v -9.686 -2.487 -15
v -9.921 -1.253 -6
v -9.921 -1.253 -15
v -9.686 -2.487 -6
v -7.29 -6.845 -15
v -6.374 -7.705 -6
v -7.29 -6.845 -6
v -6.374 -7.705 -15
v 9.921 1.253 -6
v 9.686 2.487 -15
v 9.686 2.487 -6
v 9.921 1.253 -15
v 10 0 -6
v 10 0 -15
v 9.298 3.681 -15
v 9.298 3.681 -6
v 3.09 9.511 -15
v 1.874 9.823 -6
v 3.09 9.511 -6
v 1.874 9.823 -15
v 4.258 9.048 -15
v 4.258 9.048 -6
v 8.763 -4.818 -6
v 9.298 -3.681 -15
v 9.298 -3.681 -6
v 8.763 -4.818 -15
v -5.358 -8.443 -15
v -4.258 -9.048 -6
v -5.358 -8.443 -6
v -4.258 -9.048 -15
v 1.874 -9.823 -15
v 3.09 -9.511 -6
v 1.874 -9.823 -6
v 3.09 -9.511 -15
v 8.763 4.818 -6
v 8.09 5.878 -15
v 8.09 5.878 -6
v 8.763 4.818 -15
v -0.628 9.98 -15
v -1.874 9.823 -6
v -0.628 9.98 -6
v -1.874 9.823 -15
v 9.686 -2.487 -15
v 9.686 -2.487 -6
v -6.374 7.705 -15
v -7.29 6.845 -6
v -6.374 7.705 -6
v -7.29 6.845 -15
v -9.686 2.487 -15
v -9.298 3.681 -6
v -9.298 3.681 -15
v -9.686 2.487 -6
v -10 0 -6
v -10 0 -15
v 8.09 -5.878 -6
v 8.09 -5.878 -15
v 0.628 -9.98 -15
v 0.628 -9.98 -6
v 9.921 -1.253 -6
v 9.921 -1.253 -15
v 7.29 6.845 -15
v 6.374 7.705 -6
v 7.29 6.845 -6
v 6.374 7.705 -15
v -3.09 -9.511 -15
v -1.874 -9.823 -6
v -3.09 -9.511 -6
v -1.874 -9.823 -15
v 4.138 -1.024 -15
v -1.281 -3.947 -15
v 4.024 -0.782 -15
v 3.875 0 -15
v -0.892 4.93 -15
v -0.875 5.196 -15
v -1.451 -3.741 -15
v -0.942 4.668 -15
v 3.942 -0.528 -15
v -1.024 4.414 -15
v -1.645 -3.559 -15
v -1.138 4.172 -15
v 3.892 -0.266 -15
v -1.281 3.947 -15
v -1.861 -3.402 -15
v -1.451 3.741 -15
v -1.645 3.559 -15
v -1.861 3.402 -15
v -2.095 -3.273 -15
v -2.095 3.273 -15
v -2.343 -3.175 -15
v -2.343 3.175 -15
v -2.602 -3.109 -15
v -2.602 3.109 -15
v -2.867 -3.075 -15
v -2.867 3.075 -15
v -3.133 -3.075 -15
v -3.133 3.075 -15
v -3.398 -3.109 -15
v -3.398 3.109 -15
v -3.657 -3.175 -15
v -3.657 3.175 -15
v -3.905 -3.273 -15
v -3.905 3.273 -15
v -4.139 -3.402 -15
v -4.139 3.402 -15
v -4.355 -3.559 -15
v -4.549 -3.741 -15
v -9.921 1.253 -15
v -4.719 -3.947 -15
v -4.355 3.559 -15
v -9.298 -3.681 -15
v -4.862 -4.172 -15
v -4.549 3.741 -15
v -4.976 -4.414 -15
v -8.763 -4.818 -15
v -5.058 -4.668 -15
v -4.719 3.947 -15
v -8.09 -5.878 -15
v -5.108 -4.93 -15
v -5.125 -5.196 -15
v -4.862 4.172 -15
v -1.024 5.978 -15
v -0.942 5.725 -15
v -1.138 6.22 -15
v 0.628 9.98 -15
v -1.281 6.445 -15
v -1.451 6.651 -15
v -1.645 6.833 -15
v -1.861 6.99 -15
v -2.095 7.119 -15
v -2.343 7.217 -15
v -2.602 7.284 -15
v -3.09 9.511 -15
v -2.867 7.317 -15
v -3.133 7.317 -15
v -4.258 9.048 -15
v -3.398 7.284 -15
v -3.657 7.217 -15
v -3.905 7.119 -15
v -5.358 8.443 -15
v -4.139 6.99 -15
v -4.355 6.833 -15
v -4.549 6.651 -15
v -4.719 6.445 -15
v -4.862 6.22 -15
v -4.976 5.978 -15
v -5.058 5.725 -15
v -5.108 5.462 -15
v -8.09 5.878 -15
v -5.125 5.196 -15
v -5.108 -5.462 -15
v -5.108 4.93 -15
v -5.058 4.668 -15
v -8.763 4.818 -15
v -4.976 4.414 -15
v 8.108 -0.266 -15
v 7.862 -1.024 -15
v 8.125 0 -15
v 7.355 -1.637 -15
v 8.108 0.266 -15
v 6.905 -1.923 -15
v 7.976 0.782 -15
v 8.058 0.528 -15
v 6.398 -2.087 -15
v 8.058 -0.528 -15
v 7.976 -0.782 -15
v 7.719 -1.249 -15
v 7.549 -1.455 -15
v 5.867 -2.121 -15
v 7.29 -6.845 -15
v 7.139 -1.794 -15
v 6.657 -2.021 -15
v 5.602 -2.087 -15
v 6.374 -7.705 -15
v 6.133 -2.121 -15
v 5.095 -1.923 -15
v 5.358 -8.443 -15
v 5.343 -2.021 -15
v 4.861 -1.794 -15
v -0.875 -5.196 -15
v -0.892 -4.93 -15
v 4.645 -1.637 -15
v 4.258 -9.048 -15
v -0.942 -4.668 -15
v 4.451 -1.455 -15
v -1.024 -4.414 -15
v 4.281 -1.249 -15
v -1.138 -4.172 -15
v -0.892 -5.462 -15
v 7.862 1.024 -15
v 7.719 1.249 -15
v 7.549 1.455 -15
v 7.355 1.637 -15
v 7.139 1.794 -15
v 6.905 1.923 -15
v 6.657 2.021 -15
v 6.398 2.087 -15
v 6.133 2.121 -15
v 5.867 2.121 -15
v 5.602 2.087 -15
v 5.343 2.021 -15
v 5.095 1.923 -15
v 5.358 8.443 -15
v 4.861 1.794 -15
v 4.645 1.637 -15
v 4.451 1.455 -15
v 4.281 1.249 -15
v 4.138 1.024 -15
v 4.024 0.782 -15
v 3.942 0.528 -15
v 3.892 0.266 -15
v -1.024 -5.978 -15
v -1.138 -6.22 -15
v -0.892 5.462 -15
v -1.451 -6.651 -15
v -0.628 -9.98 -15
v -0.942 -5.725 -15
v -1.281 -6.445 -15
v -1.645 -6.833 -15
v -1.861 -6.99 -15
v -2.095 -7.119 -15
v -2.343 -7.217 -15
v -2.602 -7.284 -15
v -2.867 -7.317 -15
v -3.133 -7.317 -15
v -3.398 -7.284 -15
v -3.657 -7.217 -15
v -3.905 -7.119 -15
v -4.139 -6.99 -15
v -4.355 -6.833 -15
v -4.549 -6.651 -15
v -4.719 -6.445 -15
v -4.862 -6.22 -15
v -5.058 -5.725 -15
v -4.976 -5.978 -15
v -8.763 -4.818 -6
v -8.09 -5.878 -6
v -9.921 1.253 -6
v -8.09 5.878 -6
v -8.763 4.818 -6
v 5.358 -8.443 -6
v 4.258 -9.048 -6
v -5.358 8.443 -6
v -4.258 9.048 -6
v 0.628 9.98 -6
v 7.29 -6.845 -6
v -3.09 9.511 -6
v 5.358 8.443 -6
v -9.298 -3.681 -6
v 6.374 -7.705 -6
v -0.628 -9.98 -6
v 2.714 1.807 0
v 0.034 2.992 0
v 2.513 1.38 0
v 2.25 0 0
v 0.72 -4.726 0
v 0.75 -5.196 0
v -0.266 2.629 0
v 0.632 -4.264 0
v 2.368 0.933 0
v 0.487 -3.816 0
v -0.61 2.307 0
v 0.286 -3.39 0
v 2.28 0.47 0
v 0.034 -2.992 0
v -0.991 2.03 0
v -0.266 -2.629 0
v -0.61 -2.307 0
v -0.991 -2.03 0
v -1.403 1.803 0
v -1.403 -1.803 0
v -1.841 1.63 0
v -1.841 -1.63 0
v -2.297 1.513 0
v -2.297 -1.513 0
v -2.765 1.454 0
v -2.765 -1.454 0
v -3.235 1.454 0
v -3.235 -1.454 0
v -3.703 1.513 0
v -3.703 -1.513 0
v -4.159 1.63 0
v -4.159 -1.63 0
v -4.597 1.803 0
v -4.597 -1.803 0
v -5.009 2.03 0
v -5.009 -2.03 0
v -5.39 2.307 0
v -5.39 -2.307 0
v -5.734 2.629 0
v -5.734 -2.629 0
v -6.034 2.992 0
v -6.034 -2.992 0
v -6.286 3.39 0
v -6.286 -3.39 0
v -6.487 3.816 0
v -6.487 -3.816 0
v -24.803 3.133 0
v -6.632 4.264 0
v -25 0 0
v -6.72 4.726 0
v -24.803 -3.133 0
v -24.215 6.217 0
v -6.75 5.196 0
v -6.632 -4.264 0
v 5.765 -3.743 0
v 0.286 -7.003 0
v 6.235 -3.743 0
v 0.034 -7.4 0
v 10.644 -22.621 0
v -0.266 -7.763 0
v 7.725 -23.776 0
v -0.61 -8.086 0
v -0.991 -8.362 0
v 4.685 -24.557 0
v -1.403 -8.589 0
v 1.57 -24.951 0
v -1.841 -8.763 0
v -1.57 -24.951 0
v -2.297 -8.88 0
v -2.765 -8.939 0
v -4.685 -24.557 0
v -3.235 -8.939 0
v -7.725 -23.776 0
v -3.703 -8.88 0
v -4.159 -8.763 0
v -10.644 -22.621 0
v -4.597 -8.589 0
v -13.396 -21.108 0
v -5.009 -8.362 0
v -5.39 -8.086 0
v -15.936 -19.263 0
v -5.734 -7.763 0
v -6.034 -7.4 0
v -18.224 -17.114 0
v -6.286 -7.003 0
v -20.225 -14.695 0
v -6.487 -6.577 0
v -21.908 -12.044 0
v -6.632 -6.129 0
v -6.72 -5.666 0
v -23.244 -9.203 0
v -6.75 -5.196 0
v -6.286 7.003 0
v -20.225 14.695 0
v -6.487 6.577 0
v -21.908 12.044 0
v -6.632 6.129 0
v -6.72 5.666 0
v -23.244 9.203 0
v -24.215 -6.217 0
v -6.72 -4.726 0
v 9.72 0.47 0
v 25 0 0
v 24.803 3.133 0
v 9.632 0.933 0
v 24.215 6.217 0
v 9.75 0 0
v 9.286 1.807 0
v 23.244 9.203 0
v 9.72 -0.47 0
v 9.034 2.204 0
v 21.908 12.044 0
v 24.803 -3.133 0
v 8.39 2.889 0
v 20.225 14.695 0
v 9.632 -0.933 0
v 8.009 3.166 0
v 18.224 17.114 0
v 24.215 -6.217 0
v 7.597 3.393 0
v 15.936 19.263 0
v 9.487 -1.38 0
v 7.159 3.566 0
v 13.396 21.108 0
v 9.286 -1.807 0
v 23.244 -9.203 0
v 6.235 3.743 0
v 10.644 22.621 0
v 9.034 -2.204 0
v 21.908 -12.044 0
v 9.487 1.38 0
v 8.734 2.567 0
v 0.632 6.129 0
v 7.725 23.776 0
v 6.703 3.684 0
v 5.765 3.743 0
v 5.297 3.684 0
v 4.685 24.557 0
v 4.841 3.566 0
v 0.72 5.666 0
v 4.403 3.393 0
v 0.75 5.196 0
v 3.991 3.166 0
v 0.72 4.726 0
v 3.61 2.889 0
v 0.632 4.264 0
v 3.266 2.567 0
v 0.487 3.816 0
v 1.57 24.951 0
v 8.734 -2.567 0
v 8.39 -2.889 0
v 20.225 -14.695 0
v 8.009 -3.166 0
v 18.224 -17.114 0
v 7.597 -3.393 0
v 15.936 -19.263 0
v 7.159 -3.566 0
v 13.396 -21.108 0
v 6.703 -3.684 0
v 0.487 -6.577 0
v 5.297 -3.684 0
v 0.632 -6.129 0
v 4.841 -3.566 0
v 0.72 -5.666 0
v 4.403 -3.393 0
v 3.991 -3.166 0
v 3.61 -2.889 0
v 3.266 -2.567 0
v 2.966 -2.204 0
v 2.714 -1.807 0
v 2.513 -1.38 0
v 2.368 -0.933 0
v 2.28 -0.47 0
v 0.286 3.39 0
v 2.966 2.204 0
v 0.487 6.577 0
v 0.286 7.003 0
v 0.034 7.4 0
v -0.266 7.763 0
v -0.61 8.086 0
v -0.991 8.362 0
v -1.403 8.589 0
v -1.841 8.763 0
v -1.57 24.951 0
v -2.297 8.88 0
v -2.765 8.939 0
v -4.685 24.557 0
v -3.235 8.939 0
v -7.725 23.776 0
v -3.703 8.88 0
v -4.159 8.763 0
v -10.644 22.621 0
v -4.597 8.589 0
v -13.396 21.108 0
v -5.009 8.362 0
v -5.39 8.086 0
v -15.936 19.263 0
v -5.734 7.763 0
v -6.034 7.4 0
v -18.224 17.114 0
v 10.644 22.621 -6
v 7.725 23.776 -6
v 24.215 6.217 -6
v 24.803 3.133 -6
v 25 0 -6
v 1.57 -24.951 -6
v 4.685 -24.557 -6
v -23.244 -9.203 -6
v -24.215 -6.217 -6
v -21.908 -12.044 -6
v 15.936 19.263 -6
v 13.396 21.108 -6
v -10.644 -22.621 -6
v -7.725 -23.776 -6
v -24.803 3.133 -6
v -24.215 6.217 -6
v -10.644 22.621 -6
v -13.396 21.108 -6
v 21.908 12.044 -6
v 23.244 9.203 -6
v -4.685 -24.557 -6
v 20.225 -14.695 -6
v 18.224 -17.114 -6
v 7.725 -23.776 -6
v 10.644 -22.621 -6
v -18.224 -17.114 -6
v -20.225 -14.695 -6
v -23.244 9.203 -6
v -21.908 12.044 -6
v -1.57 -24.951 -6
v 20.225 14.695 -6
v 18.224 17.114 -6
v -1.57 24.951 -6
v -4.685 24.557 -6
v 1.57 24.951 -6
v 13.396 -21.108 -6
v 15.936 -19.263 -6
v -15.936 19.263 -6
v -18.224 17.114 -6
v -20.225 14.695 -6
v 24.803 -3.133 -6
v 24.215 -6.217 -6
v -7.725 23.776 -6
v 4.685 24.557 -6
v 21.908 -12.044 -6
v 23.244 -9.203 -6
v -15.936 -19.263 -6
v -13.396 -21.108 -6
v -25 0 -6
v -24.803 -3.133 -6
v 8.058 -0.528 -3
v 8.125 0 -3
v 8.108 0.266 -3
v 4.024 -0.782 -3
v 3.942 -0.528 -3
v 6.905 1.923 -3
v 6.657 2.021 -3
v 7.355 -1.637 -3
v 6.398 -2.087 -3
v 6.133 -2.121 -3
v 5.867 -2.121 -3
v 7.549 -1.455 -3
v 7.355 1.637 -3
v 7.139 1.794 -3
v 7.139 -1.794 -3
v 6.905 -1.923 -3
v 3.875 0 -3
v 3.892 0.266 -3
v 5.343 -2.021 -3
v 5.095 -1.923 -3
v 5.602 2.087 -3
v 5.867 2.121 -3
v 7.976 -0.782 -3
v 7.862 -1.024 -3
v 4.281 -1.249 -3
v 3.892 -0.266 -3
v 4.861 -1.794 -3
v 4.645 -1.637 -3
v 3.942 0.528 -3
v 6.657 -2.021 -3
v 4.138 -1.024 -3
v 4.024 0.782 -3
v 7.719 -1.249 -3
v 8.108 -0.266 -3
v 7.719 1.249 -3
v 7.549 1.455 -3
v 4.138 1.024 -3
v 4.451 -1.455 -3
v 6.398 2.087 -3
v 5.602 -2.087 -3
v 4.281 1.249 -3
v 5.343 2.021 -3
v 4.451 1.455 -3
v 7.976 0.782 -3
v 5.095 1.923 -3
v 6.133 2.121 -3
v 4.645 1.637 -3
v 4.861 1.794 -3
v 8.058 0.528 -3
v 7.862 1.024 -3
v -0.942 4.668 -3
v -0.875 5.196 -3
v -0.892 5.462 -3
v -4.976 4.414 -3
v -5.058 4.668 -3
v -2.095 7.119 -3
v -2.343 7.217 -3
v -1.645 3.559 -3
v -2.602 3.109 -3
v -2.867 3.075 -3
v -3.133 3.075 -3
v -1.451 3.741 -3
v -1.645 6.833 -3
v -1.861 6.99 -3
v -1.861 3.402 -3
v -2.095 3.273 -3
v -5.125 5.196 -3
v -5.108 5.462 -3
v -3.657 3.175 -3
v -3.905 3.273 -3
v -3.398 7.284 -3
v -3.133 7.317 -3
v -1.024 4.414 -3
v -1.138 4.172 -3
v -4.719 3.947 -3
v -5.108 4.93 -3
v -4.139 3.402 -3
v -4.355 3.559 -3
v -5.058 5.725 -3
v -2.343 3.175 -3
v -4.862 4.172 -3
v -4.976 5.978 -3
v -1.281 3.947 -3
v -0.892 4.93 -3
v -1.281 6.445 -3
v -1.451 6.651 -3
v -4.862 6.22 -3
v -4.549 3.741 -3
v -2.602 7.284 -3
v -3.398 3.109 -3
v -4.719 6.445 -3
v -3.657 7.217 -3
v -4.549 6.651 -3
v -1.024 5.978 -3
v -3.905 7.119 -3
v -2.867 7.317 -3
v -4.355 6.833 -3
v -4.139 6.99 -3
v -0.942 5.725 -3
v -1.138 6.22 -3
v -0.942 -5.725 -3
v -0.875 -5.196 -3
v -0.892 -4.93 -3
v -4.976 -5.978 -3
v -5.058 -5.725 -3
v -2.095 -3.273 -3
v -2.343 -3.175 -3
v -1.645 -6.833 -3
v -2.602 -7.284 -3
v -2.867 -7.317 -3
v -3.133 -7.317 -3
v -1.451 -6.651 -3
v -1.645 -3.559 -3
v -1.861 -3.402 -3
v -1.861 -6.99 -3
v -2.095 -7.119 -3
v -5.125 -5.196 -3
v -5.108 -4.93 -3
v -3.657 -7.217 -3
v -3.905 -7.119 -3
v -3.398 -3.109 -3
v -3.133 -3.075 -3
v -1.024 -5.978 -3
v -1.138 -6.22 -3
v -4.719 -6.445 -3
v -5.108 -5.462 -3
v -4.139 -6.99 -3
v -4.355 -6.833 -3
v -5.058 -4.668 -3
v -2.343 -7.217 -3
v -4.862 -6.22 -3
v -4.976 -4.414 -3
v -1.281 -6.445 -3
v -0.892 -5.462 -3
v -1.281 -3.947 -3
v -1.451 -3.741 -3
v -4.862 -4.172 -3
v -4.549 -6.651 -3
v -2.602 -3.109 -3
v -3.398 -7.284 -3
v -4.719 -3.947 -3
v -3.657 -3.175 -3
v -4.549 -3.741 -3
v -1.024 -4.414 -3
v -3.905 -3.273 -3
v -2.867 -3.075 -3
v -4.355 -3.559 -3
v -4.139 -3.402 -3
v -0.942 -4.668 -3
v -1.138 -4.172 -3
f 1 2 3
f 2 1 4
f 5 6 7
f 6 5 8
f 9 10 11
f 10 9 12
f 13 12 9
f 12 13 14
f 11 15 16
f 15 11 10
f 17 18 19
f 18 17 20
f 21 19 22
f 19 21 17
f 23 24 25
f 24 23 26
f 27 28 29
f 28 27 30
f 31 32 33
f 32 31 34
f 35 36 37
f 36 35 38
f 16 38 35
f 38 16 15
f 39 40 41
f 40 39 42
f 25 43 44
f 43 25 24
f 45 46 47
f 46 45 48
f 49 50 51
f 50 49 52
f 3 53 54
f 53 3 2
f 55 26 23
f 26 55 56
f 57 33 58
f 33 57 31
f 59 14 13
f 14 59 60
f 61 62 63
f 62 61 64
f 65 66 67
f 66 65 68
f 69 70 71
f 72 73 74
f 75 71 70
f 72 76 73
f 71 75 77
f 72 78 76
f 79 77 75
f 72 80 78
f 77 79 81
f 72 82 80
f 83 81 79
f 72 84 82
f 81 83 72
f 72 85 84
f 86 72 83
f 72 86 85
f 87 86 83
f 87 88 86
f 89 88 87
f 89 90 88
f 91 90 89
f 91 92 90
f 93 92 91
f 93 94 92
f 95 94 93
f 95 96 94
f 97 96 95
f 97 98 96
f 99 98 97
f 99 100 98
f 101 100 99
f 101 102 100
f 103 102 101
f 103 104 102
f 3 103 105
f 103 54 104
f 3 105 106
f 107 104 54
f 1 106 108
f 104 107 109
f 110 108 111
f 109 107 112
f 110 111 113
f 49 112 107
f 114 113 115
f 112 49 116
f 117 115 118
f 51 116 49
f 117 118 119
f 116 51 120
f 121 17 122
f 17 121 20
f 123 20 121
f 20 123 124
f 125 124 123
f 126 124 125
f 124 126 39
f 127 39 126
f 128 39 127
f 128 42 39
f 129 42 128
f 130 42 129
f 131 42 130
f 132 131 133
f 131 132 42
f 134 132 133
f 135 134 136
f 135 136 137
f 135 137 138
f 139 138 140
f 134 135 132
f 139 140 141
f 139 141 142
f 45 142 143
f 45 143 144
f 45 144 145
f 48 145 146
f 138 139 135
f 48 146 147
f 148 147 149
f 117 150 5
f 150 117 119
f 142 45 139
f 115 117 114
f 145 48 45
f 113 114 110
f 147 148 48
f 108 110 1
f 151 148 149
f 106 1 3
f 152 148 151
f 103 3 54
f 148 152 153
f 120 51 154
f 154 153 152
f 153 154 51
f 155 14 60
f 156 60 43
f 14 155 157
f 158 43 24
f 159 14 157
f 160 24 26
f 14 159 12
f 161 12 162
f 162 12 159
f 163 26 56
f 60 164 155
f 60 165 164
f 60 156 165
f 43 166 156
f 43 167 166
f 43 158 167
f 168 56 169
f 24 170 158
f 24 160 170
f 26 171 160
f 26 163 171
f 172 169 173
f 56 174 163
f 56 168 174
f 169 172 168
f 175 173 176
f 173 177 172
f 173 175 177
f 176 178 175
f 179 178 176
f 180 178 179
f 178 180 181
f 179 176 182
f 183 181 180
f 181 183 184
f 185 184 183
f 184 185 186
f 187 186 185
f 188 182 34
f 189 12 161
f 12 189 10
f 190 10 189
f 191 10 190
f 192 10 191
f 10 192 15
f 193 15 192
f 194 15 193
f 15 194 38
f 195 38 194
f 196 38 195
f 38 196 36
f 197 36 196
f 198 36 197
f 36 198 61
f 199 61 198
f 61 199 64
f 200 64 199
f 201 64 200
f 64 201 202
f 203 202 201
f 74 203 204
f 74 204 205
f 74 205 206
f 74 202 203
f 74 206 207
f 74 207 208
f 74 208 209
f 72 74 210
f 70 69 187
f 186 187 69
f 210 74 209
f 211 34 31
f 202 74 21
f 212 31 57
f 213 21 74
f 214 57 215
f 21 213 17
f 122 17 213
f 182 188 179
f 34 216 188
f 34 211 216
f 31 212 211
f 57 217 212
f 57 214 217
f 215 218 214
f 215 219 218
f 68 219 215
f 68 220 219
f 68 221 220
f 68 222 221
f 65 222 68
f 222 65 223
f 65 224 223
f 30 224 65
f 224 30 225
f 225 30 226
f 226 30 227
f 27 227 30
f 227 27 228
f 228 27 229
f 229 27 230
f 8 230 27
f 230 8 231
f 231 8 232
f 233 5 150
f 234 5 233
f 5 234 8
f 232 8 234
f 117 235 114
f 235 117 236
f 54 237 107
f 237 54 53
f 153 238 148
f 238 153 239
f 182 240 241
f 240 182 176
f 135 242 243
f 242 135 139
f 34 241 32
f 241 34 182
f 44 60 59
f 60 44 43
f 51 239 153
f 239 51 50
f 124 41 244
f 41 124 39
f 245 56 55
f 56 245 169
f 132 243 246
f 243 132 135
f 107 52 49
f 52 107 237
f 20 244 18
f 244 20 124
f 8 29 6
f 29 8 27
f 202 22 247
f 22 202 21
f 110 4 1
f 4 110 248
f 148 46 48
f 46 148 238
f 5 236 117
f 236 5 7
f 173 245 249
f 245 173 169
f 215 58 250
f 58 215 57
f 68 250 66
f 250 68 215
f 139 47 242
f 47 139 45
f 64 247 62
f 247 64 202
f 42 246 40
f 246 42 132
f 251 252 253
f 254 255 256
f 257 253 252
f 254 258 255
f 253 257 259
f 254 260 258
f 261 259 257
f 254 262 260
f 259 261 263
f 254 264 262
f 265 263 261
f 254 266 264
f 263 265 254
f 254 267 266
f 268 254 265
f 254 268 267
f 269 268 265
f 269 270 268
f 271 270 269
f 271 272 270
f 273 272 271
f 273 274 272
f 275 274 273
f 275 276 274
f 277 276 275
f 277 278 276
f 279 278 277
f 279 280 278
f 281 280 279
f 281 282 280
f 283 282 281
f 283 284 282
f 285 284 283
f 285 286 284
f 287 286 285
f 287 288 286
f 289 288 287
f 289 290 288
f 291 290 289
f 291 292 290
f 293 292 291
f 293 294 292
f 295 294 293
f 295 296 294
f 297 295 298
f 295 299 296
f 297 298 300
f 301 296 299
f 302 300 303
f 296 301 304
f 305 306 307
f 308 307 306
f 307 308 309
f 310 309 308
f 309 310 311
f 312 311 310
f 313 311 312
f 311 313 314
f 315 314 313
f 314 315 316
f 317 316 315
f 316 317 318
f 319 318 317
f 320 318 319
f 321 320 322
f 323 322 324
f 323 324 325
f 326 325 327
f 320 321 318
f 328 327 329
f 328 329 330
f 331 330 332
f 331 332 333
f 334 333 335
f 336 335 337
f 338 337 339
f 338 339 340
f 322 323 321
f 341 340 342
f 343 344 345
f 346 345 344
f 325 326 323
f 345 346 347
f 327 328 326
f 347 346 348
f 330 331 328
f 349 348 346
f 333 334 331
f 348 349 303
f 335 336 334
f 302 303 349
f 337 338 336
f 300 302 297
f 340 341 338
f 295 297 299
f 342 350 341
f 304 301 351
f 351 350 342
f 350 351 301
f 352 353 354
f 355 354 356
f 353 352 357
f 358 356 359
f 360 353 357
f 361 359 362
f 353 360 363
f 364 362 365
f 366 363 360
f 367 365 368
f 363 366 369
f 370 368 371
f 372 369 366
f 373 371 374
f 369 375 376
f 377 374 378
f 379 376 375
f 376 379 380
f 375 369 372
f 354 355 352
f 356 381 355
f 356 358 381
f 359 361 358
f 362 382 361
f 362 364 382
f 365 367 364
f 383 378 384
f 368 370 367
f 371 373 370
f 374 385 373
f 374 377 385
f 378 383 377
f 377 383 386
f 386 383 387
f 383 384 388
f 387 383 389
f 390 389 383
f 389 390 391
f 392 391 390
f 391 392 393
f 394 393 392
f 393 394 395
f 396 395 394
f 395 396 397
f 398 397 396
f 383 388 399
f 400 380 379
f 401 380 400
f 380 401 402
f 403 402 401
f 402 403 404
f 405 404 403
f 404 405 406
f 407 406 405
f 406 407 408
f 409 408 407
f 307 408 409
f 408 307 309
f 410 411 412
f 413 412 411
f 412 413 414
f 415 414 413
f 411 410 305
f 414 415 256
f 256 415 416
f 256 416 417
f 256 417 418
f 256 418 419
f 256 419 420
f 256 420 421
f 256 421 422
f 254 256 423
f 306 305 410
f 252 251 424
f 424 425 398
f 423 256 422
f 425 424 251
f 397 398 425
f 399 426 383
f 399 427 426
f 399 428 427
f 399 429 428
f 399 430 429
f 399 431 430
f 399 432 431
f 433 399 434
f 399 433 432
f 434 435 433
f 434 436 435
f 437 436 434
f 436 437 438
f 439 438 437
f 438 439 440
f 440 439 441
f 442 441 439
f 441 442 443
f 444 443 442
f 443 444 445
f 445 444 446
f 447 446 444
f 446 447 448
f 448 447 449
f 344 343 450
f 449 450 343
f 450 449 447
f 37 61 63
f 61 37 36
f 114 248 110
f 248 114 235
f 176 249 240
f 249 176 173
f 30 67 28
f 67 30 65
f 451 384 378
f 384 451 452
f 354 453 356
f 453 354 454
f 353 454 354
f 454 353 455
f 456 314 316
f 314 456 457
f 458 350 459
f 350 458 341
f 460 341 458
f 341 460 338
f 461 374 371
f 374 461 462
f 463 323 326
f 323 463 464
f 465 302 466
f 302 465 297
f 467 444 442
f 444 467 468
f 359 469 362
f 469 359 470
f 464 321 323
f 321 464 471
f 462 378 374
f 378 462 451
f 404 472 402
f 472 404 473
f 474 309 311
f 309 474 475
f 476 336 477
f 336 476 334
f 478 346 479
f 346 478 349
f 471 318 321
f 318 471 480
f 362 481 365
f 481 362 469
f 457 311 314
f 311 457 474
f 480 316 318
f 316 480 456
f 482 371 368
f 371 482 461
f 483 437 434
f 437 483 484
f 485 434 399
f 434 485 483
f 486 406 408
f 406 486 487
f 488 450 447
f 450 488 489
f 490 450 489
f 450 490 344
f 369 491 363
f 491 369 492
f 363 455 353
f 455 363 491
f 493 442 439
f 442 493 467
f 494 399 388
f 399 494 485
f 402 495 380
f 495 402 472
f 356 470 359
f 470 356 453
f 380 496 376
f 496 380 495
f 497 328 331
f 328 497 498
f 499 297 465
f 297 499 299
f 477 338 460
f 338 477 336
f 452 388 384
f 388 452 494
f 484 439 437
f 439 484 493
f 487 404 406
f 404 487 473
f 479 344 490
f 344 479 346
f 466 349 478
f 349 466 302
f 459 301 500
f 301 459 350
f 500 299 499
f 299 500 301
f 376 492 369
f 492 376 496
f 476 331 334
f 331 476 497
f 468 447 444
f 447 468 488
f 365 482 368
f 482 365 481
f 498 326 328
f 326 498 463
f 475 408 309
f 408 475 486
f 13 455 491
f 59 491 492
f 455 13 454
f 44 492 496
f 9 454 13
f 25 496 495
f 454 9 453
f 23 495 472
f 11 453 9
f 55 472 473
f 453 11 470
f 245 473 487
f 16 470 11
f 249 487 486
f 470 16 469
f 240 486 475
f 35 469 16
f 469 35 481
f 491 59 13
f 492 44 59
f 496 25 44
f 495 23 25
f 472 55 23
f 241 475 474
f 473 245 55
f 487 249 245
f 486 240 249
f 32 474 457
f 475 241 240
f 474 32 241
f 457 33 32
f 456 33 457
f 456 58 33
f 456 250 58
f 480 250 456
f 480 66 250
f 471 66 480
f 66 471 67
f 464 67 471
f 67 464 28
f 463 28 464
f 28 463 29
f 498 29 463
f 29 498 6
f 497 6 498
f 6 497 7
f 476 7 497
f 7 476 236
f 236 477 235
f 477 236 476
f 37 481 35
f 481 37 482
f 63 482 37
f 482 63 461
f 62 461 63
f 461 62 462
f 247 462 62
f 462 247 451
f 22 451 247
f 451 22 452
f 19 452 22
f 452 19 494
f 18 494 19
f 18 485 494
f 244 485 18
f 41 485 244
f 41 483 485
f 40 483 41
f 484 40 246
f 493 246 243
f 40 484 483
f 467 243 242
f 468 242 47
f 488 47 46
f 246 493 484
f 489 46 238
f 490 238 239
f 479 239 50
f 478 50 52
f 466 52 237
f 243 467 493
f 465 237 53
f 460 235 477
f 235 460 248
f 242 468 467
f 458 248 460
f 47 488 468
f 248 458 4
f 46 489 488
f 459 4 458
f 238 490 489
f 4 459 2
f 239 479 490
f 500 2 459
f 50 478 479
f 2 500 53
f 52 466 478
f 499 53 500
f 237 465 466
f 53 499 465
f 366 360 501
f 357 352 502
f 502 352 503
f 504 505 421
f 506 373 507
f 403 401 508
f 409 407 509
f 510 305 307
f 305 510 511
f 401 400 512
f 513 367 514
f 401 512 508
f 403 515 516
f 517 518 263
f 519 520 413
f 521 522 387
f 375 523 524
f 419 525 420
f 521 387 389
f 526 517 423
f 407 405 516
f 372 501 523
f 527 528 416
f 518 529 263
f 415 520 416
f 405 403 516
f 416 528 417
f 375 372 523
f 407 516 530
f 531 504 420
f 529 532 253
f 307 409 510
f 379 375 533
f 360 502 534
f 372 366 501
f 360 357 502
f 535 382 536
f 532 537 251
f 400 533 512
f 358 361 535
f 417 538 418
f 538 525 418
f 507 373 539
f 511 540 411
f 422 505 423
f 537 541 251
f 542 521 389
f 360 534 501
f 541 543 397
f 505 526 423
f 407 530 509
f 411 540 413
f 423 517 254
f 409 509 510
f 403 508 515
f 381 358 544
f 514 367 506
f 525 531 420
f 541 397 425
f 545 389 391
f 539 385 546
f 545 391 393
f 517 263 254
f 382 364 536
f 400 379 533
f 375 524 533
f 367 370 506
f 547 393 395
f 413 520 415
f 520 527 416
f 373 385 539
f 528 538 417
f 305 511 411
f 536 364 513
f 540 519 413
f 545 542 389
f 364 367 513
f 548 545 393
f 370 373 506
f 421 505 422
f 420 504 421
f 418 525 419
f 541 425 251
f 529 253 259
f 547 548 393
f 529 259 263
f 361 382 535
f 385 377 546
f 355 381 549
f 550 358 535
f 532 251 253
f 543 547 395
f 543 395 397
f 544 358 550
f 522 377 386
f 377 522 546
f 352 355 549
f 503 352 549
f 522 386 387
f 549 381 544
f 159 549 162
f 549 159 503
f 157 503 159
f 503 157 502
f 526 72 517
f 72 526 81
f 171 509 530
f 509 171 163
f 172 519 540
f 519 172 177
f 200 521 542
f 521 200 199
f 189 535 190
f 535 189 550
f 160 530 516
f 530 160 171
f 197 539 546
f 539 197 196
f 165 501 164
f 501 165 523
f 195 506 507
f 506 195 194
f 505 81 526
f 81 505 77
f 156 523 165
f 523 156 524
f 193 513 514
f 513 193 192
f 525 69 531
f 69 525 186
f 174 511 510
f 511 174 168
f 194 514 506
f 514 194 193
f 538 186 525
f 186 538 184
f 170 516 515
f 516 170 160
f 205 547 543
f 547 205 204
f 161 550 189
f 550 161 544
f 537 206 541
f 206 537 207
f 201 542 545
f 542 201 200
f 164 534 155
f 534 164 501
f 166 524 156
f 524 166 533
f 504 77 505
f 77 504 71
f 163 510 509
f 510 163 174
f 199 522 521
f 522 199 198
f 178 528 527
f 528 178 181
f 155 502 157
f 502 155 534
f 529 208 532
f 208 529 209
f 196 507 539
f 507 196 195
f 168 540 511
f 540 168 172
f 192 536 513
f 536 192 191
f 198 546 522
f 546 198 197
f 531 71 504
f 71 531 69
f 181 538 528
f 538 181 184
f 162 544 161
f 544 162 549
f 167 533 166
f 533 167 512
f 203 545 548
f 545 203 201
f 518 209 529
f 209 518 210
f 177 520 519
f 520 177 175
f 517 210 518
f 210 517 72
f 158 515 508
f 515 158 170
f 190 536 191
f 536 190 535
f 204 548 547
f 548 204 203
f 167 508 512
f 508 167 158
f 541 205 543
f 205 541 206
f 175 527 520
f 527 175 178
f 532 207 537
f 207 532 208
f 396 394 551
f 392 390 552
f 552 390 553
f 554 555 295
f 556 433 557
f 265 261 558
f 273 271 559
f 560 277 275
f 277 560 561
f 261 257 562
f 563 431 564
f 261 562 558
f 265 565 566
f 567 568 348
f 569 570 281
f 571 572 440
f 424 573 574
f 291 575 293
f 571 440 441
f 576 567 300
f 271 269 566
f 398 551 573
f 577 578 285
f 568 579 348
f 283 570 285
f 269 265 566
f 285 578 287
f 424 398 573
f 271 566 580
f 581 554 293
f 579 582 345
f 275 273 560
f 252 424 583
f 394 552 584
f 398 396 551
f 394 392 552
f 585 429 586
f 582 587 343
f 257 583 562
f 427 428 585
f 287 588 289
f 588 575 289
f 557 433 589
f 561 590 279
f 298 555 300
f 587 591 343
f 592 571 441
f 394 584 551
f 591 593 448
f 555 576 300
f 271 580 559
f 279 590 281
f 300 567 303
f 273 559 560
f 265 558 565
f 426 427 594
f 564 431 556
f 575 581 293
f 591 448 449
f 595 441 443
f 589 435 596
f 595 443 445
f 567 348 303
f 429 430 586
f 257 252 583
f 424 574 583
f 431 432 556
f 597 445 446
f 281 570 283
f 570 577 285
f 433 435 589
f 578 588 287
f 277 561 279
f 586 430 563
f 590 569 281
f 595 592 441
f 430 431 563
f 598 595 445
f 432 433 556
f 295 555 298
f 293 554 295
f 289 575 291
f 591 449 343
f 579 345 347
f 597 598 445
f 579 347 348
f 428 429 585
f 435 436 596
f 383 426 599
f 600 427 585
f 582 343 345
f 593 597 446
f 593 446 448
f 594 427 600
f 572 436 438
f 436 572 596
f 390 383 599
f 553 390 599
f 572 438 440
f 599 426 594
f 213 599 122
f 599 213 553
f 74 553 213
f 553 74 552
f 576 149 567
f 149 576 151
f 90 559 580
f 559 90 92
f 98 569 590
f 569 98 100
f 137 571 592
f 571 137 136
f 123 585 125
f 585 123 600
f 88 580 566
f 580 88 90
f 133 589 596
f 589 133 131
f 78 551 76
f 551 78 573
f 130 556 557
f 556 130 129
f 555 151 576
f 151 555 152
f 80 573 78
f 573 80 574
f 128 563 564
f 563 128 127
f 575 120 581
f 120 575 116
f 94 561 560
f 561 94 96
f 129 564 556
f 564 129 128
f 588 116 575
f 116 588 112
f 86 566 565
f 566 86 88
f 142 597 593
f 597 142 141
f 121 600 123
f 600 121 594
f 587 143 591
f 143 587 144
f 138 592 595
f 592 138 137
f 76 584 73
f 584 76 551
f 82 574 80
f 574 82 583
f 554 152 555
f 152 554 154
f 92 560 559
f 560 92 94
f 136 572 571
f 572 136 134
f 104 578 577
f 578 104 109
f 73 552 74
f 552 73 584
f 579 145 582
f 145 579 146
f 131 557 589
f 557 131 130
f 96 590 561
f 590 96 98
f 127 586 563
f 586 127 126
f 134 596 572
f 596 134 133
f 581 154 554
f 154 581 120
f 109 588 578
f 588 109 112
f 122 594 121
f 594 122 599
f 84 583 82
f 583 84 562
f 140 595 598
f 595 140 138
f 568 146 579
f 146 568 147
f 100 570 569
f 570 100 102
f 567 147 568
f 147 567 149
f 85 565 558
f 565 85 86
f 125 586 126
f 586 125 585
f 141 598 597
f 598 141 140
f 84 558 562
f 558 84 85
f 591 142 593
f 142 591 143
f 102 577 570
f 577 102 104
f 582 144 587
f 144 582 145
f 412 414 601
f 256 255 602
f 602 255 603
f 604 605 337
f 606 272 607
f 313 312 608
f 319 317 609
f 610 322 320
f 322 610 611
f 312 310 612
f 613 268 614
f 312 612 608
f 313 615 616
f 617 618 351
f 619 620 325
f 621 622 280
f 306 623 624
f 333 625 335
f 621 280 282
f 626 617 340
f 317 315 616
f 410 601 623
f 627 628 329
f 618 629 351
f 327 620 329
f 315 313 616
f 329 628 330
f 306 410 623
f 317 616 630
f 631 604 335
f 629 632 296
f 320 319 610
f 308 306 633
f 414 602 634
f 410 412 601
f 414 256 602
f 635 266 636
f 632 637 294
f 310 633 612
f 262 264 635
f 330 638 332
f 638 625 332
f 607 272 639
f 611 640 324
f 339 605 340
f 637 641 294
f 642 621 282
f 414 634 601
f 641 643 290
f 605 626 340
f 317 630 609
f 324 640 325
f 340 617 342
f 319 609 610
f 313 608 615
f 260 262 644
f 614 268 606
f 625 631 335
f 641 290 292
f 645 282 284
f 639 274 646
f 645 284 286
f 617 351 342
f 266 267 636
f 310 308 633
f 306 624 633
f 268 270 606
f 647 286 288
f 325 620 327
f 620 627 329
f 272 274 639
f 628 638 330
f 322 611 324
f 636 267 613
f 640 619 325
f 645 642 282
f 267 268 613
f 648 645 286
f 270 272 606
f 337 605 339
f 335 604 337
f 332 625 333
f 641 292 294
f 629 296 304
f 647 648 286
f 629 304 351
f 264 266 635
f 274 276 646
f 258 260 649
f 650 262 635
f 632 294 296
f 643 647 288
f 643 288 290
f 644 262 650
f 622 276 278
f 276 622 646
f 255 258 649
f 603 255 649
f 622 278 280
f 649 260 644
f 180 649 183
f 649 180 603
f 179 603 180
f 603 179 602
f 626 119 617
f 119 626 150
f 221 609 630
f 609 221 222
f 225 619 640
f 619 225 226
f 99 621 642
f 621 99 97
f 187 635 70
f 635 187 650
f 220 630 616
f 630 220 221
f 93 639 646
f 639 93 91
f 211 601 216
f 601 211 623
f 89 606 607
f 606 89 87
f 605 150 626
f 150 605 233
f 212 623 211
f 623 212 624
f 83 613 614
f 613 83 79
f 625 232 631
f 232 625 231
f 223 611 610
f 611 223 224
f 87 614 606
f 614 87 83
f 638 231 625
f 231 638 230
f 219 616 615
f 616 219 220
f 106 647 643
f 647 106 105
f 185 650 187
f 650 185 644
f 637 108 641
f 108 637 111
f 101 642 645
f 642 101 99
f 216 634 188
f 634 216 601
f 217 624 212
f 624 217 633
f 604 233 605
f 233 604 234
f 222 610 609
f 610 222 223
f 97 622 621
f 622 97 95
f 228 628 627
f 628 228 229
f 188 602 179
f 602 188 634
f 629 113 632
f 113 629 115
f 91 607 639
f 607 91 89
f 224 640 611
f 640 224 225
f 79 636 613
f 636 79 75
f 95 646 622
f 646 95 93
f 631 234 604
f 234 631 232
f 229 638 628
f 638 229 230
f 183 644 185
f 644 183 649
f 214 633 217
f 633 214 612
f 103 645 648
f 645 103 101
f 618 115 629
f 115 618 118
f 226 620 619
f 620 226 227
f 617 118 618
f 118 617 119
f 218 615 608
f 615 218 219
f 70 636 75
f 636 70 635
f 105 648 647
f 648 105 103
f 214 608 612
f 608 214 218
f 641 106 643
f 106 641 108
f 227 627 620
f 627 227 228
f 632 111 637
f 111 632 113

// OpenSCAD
$fn = 50;


difference() {
	union() {
		translate(v = [0, 0, -15.0000000000]) {
			cylinder(h = 15, r = 10.0000000000);
		}
		translate(v = [0, 0, -6.0000000000]) {
			cylinder(h = 6, r = 25.0000000000);
		}
	}
	union() {
		translate(v = [6.0000000000, 0.0000000000, 0]) {
			rotate(a = [0, 0, 0]) {
				difference() {
					union() {
						#translate(v = [0, 0, -15.0000000000]) {
							cylinder(h = 15, r = 2.0000000000);
						}
						#translate(v = [0, 0, -3]) {
							cylinder(h = 3, r = 10.0000000000, r1 = 2.1250000000, r2 = 3.7500000000);
						}
						#translate(v = [0, 0, -15.0000000000]) {
							cylinder(h = 15, r = 2.1250000000);
						}
						#translate(v = [0, 0, -15.0000000000]) {
							cylinder(h = 15, r = 2.0000000000);
						}
					}
					union();
				}
			}
		}
		translate(v = [-3.0000000000, 5.1961524227, 0]) {
			rotate(a = [0, 0, 0]) {
				difference() {
					union() {
						#translate(v = [0, 0, -15.0000000000]) {
							cylinder(h = 15, r = 2.0000000000);
						}
						#translate(v = [0, 0, -3]) {
							cylinder(h = 3, r = 10.0000000000, r1 = 2.1250000000, r2 = 3.7500000000);
						}
						#translate(v = [0, 0, -15.0000000000]) {
							cylinder(h = 15, r = 2.1250000000);
						}
						#translate(v = [0, 0, -15.0000000000]) {
							cylinder(h = 15, r = 2.0000000000);
						}
					}
					union();
				}
			}
		}
		translate(v = [-3.0000000000, -5.1961524227, 0]) {
			rotate(a = [0, 0, 0]) {
				difference() {
					union() {
						#translate(v = [0, 0, -15.0000000000]) {
							cylinder(h = 15, r = 2.0000000000);
						}
						#translate(v = [0, 0, -3]) {
							cylinder(h = 3, r = 10.0000000000, r1 = 2.1250000000, r2 = 3.7500000000);
						}
						#translate(v = [0, 0, -15.0000000000]) {
							cylinder(h = 15, r = 2.1250000000);
						}
						#translate(v = [0, 0, -15.0000000000]) {
							cylinder(h = 15, r = 2.0000000000);
						}
					}
					union();
				}
			}
		}
	}
}
